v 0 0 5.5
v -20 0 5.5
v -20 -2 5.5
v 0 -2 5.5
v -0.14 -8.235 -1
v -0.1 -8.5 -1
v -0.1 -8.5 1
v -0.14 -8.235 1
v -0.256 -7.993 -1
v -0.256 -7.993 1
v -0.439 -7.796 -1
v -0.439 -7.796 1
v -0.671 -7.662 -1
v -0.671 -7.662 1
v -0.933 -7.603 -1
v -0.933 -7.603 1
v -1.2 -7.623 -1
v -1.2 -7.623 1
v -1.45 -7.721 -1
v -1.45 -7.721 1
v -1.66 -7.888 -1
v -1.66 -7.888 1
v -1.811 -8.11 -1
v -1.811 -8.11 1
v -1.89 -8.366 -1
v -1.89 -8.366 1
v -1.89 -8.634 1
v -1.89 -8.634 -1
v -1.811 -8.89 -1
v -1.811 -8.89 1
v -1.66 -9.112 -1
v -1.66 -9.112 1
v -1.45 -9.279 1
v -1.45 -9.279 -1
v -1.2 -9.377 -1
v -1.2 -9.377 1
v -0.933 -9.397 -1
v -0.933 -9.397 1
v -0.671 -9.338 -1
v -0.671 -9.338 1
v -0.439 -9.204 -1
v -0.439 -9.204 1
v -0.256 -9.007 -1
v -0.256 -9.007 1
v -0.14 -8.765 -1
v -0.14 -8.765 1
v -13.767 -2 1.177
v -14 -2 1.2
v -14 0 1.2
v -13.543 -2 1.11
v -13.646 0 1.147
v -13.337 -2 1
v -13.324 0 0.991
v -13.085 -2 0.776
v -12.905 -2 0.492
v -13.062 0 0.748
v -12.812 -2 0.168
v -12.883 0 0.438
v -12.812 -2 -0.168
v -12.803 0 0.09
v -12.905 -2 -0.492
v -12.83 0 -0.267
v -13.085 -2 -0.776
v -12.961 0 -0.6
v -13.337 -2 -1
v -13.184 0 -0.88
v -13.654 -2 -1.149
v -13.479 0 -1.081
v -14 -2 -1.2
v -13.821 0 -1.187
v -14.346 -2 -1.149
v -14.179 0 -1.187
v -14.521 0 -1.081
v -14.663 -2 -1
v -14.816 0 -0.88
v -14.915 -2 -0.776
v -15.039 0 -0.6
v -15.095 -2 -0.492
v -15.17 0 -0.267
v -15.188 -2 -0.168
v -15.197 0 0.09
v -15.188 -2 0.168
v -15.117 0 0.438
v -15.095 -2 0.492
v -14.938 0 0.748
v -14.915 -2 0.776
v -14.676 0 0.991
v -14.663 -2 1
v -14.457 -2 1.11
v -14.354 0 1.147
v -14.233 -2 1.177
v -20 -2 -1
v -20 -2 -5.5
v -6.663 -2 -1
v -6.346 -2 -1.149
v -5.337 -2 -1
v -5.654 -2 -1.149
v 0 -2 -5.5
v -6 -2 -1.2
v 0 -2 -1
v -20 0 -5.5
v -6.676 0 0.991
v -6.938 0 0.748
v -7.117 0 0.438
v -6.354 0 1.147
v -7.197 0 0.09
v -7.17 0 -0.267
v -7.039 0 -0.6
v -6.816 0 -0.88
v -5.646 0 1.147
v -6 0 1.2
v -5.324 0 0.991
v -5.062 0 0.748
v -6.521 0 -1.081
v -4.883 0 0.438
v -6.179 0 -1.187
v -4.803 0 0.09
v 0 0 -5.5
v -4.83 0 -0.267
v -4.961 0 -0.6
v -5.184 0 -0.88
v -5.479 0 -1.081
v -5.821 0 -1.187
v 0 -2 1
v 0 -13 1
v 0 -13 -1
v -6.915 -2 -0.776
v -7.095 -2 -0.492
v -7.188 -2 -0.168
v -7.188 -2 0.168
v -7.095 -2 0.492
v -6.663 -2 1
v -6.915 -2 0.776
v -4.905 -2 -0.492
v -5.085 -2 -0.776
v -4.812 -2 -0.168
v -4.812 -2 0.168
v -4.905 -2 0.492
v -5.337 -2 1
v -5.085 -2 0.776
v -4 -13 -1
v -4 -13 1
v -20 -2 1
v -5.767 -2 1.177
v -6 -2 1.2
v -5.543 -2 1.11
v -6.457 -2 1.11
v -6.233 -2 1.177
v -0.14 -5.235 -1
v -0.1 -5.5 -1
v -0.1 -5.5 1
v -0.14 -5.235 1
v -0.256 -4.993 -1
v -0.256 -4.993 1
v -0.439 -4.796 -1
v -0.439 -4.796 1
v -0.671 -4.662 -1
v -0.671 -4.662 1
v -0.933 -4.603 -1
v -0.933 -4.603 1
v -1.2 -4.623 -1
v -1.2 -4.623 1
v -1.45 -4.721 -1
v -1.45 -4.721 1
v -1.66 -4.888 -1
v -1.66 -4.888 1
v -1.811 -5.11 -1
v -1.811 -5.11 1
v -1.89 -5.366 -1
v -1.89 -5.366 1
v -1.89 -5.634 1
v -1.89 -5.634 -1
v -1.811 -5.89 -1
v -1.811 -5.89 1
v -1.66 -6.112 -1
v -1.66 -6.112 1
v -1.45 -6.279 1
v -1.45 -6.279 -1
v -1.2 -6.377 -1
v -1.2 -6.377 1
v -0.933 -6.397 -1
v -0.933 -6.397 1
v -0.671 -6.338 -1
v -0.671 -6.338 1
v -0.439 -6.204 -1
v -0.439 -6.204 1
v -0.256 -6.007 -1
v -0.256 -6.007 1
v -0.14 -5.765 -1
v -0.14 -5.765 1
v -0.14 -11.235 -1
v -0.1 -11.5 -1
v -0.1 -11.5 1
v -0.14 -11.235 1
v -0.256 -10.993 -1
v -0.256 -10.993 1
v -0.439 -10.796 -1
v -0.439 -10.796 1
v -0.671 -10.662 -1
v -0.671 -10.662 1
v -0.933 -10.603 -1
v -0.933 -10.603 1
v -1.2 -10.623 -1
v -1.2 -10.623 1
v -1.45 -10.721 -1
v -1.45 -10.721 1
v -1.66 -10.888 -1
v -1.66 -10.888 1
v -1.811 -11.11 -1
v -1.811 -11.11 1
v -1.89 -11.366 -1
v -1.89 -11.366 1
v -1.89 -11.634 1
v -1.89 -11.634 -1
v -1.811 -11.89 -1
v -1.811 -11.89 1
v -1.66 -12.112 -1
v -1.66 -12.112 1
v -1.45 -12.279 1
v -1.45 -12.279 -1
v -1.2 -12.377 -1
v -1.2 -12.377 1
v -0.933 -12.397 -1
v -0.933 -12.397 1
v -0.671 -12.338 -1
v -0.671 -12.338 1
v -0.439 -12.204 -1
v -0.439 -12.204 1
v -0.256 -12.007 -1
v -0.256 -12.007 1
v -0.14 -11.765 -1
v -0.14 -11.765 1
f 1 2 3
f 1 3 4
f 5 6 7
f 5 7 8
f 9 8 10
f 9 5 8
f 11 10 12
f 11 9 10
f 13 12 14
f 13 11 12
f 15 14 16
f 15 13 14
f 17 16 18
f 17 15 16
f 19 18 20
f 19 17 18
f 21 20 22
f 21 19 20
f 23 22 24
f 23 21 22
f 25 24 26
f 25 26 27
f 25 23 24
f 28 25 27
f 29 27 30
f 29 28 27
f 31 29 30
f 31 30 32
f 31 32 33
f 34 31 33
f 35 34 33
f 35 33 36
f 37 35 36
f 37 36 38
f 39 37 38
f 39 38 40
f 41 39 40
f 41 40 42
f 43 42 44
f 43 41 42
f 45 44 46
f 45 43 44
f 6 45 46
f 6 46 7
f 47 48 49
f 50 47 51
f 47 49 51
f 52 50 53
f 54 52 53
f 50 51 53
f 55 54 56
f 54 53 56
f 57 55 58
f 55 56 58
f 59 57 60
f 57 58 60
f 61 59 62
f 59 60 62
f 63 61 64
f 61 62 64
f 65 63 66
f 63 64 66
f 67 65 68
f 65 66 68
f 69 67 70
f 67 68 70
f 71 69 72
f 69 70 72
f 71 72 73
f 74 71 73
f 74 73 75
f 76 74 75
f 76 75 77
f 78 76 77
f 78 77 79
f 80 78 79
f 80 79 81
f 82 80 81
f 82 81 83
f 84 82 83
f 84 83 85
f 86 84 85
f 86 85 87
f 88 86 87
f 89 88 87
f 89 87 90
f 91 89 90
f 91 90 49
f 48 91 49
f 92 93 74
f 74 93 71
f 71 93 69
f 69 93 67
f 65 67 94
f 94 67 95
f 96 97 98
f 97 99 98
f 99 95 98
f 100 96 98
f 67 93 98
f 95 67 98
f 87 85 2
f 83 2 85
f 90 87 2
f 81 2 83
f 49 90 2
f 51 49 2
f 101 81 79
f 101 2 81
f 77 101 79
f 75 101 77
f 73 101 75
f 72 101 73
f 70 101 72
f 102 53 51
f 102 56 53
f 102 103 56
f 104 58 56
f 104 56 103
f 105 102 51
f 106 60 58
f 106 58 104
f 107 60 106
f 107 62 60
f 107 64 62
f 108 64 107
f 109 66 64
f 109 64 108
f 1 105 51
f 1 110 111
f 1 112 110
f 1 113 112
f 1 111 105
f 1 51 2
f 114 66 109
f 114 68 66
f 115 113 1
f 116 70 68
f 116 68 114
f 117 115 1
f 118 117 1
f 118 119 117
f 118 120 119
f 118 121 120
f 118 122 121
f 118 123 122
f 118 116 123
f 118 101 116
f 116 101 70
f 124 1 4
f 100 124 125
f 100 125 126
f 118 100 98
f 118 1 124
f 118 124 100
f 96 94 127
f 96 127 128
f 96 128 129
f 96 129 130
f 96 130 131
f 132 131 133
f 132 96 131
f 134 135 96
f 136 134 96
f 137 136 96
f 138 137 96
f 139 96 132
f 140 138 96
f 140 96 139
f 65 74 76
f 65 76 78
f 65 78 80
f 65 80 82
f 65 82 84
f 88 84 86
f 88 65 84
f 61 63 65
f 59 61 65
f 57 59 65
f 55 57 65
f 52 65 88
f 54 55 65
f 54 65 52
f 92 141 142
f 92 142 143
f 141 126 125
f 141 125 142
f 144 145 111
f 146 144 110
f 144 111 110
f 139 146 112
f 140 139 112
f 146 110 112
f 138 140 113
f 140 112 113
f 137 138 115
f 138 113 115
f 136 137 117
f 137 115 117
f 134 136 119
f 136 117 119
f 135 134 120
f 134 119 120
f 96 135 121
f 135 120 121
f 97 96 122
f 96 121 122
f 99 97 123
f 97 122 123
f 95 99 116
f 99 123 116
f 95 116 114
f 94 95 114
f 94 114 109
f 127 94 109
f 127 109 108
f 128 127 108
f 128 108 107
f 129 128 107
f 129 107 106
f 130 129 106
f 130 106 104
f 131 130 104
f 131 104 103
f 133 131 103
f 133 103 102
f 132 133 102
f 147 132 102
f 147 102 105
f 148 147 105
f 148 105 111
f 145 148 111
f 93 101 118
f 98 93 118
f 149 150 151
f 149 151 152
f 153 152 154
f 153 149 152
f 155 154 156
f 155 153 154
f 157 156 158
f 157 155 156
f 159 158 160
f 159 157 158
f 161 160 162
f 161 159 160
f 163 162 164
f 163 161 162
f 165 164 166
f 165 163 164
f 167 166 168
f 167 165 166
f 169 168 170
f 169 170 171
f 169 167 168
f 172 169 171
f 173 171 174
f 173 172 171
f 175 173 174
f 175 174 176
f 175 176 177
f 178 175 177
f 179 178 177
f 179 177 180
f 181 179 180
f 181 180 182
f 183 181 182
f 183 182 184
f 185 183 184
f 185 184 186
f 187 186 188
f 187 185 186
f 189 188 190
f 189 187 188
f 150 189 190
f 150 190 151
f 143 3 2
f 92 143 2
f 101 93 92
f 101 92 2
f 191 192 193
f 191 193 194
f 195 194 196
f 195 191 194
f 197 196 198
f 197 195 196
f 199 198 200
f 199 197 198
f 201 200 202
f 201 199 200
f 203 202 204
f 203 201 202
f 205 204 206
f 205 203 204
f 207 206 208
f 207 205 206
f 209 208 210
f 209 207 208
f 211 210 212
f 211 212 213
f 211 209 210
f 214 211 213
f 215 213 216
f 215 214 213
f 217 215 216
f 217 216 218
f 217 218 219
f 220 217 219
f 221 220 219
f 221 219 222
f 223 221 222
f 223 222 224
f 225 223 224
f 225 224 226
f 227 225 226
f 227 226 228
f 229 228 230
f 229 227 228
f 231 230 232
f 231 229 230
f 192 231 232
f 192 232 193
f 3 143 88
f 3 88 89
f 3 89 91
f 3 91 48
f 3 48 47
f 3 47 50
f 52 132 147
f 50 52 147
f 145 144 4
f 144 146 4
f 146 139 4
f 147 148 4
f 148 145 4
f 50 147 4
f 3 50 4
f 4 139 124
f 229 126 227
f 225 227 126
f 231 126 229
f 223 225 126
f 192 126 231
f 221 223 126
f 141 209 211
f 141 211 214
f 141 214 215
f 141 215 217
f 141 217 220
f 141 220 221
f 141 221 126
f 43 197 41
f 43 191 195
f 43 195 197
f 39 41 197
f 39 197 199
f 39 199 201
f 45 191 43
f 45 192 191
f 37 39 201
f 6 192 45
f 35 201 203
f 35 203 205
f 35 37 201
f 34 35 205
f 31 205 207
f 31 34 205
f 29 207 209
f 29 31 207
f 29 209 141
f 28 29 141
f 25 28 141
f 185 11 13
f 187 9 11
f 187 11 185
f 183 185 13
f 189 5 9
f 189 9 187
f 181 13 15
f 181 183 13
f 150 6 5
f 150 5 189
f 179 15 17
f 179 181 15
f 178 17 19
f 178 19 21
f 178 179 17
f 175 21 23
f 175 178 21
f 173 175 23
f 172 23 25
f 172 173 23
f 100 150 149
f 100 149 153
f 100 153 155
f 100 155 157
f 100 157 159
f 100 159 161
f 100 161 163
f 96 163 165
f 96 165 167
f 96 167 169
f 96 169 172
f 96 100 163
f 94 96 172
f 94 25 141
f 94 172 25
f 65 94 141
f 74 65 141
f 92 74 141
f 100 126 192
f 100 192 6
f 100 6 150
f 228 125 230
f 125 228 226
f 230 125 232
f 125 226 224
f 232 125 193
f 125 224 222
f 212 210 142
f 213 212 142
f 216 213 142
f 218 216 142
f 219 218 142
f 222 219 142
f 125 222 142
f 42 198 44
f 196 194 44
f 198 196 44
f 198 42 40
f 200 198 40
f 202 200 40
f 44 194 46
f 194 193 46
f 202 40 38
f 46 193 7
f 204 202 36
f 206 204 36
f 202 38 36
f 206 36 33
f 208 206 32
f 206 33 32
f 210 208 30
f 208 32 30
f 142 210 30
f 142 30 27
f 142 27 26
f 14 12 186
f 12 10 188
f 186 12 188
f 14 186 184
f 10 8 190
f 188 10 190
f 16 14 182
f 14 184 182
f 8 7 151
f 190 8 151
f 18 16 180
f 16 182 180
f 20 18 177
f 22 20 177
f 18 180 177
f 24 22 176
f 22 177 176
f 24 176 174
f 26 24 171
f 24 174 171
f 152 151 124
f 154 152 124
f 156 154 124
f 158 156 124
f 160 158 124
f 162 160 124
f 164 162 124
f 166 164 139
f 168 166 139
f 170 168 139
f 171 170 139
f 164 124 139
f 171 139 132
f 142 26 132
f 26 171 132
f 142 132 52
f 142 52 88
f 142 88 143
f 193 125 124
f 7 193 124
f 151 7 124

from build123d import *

# Parameters (mm, degrees)
SKETCH1_W           = 20
SKETCH1_H           = 11
BOSS_EXTRUDE1_DEPTH = 2
BOSS_EXTRUDE2_DEPTH = 2
SKETCH3_R           = 0.9
CUT_EXTRUDE1_DEPTH  = 2
SKETCH4_R           = 1.2
CUT_EXTRUDE2_DEPTH  = 2


with BuildPart() as part:
    # Sketch1 → Boss-Extrude1 (new body)
    with BuildSketch(Plane(origin=(0, 0, 0), x_dir=(1, 0, 0), z_dir=(0, 1, 0))):
        with Locations((-10, 0)):
            Rectangle(SKETCH1_W, SKETCH1_H)
    extrude(amount=-BOSS_EXTRUDE1_DEPTH)

    # Sketch2 → Boss-Extrude2 (add)
    with BuildSketch(Plane.XY.offset(-1)):
        Polygon((0, 0), (0, -13), (-4, -13), (-20, -2), (-20, 0), align=None)
    extrude(amount=BOSS_EXTRUDE2_DEPTH)

    # Sketch3 → Cut-Extrude1 (cut)
    with BuildSketch(Plane.XY.offset(-1)):
        with Locations((-1, -5.5)):
            Circle(SKETCH3_R)
        with Locations((-1, -8.5)):
            Circle(SKETCH3_R)
        with Locations((-1, -11.5)):
            Circle(SKETCH3_R)
    extrude(amount=CUT_EXTRUDE1_DEPTH, mode=Mode.SUBTRACT)

    # Sketch4 → Cut-Extrude2 (cut)
    with BuildSketch(Plane(origin=(0, 0, 0), x_dir=(1, 0, 0), z_dir=(0, 1, 0))):
        with Locations(Location((-6, 0, 0), (0, 0, 270))):
            Circle(SKETCH4_R)
        with Locations(Location((-14, 0, 0), (0, 0, 270))):
            Circle(SKETCH4_R)
    extrude(amount=-CUT_EXTRUDE2_DEPTH, mode=Mode.SUBTRACT)


solid = part.part
